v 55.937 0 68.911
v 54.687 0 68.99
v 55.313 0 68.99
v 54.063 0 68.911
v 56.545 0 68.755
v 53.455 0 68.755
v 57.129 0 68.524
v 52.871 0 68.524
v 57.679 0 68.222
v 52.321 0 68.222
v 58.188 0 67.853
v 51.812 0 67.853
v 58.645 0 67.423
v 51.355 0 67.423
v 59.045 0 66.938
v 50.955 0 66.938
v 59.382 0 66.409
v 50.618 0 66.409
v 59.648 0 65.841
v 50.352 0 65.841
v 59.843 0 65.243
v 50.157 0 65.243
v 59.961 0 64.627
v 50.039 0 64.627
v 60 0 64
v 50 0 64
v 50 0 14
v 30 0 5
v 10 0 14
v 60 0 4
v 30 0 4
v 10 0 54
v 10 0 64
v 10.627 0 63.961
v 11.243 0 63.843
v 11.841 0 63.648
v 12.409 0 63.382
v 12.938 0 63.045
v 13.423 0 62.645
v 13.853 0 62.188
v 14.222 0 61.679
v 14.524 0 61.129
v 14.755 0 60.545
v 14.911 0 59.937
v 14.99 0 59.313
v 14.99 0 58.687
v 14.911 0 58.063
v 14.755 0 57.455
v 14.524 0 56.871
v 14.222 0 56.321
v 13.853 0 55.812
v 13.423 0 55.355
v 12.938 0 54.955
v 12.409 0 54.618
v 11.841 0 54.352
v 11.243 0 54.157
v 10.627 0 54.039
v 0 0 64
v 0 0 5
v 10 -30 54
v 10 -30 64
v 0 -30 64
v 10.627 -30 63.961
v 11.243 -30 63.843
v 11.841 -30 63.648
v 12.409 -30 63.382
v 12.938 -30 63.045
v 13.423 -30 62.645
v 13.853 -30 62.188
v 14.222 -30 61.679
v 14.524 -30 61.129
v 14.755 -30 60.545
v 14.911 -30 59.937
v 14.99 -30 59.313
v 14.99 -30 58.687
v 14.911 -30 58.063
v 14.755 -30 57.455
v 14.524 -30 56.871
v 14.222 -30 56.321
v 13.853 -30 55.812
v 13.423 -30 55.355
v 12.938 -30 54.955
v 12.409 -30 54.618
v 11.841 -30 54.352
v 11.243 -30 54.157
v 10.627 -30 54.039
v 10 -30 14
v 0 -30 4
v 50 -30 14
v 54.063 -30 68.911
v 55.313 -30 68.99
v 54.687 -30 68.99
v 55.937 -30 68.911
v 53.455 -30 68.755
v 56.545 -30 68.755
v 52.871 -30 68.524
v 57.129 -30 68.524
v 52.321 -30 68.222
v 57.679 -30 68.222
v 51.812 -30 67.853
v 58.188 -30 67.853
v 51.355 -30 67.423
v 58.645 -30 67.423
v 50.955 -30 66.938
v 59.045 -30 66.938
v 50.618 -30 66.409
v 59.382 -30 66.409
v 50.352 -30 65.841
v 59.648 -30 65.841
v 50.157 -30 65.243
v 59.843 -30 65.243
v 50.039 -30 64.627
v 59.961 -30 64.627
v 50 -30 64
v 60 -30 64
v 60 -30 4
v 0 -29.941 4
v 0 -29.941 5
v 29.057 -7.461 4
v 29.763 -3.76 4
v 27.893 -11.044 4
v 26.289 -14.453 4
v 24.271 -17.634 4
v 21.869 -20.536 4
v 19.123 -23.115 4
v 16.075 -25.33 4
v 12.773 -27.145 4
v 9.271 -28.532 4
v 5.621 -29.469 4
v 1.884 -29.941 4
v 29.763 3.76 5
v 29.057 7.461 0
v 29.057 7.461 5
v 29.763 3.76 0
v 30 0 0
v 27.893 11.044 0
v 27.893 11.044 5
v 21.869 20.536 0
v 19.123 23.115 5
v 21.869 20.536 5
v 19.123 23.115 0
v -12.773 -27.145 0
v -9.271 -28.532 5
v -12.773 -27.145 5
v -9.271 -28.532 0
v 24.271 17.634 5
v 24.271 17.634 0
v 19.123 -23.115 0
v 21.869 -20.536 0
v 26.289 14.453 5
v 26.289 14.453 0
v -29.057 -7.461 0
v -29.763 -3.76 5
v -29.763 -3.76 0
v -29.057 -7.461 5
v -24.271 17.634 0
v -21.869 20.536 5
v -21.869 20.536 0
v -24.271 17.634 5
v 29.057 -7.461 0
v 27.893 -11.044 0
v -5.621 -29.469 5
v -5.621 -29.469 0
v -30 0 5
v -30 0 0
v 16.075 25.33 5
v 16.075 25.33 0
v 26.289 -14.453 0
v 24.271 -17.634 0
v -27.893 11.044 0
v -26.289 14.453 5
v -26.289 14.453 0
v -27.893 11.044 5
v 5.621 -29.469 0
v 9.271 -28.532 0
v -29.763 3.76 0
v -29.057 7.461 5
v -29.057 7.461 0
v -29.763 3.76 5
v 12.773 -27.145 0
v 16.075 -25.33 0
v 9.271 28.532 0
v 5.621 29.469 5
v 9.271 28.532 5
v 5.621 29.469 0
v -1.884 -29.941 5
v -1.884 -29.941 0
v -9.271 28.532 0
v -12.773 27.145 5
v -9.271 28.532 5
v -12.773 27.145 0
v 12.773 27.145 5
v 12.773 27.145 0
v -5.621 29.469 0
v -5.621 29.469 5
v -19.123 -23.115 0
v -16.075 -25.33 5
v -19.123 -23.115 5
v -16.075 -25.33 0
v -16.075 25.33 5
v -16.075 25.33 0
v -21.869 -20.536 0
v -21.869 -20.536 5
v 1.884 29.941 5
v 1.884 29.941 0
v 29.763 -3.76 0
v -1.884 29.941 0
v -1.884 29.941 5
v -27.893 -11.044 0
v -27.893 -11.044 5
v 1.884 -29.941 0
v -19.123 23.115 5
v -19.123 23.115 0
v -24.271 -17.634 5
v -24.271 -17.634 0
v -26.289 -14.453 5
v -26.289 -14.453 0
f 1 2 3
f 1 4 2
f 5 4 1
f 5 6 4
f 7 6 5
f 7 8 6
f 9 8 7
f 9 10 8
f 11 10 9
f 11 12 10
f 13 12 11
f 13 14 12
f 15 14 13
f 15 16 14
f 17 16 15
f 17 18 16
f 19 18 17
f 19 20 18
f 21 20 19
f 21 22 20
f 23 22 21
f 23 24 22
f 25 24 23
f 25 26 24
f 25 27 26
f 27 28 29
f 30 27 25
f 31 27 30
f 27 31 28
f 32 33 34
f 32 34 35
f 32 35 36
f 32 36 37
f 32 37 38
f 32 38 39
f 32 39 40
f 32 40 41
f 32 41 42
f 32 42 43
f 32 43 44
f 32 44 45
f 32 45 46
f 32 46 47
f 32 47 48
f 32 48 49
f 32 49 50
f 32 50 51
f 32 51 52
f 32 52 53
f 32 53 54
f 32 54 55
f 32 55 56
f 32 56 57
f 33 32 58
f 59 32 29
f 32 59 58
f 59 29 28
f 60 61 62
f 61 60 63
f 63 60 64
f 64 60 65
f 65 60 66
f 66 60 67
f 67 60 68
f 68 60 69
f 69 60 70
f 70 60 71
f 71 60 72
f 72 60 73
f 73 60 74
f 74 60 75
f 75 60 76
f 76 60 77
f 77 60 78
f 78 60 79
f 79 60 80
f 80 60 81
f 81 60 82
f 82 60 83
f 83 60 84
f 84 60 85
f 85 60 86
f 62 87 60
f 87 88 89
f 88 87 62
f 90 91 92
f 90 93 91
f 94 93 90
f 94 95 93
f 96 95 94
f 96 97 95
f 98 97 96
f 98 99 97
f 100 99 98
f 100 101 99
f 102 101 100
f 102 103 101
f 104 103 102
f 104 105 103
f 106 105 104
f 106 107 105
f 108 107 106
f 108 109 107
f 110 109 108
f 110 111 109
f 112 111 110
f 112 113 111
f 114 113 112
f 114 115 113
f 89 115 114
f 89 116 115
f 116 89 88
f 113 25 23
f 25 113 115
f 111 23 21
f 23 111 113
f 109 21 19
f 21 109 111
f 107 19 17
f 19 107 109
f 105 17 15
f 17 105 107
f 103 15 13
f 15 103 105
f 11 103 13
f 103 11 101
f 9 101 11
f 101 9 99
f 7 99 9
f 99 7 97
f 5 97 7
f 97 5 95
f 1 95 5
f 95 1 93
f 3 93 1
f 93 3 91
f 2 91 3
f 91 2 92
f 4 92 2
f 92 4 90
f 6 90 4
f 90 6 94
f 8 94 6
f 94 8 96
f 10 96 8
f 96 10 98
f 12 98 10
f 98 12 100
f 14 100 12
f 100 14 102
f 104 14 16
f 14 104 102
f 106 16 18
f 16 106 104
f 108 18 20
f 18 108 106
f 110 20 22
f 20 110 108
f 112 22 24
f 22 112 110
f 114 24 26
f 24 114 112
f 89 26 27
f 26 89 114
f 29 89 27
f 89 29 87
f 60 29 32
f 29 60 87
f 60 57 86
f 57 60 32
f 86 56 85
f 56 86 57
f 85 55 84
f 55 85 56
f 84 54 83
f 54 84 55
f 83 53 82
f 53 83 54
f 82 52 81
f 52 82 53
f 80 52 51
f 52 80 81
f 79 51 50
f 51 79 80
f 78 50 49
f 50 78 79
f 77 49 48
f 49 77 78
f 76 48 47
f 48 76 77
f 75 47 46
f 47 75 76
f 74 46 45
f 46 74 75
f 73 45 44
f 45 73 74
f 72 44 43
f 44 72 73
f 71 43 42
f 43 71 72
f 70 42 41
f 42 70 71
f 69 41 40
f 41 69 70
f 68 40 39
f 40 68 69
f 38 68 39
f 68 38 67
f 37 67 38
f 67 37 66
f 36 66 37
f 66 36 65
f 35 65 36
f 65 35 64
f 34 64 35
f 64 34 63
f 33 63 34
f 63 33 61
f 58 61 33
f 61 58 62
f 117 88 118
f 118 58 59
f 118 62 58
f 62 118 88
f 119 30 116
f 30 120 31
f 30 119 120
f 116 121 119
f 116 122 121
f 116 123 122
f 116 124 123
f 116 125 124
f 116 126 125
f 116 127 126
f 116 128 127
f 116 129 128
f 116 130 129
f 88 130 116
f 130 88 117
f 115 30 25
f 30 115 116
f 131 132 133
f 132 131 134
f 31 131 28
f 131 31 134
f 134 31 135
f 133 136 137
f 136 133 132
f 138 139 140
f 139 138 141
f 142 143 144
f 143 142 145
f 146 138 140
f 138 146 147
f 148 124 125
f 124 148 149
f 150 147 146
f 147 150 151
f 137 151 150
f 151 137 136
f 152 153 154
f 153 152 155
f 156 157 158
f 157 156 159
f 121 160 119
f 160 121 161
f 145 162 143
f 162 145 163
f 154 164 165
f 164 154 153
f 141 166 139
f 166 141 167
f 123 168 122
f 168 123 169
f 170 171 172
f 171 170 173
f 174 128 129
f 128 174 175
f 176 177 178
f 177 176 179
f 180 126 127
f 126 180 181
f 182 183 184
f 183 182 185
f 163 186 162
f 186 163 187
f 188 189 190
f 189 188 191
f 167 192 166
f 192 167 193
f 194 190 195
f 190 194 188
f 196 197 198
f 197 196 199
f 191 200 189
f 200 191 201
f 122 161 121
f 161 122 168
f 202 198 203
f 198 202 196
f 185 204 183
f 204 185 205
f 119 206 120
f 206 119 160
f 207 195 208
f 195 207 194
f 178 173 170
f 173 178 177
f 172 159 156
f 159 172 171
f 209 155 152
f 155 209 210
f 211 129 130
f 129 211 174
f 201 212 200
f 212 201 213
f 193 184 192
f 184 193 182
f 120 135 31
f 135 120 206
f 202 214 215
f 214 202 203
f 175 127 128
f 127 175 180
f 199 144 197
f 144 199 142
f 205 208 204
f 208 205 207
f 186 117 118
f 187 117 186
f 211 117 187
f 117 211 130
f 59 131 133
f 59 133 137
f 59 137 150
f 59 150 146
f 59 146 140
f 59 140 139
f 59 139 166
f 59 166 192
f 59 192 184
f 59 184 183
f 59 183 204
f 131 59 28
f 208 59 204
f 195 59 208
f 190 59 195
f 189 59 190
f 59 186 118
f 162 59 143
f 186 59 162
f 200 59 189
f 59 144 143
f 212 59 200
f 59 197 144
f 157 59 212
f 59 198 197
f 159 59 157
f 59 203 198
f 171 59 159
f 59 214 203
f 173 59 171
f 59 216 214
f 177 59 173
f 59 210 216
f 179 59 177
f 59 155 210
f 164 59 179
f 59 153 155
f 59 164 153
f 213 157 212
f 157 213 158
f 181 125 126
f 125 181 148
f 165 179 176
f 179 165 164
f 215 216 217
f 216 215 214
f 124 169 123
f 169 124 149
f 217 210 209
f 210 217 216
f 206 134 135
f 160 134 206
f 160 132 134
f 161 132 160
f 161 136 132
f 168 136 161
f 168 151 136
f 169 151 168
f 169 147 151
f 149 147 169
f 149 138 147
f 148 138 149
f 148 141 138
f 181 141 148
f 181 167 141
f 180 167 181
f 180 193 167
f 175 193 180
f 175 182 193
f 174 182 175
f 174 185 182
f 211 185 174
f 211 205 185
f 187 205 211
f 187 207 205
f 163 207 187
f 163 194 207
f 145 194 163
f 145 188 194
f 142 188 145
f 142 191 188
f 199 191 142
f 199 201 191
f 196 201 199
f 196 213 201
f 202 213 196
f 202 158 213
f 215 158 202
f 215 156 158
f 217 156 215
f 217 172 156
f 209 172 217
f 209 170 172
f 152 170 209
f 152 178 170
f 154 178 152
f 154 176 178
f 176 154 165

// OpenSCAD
$fn=50;
rotate(90, [1, 0, 0])
	translate([0, 4, 0])
		linear_extrude(height = 30)
			import(file = "test.dxf");
cylinder(h=5, r=30);
